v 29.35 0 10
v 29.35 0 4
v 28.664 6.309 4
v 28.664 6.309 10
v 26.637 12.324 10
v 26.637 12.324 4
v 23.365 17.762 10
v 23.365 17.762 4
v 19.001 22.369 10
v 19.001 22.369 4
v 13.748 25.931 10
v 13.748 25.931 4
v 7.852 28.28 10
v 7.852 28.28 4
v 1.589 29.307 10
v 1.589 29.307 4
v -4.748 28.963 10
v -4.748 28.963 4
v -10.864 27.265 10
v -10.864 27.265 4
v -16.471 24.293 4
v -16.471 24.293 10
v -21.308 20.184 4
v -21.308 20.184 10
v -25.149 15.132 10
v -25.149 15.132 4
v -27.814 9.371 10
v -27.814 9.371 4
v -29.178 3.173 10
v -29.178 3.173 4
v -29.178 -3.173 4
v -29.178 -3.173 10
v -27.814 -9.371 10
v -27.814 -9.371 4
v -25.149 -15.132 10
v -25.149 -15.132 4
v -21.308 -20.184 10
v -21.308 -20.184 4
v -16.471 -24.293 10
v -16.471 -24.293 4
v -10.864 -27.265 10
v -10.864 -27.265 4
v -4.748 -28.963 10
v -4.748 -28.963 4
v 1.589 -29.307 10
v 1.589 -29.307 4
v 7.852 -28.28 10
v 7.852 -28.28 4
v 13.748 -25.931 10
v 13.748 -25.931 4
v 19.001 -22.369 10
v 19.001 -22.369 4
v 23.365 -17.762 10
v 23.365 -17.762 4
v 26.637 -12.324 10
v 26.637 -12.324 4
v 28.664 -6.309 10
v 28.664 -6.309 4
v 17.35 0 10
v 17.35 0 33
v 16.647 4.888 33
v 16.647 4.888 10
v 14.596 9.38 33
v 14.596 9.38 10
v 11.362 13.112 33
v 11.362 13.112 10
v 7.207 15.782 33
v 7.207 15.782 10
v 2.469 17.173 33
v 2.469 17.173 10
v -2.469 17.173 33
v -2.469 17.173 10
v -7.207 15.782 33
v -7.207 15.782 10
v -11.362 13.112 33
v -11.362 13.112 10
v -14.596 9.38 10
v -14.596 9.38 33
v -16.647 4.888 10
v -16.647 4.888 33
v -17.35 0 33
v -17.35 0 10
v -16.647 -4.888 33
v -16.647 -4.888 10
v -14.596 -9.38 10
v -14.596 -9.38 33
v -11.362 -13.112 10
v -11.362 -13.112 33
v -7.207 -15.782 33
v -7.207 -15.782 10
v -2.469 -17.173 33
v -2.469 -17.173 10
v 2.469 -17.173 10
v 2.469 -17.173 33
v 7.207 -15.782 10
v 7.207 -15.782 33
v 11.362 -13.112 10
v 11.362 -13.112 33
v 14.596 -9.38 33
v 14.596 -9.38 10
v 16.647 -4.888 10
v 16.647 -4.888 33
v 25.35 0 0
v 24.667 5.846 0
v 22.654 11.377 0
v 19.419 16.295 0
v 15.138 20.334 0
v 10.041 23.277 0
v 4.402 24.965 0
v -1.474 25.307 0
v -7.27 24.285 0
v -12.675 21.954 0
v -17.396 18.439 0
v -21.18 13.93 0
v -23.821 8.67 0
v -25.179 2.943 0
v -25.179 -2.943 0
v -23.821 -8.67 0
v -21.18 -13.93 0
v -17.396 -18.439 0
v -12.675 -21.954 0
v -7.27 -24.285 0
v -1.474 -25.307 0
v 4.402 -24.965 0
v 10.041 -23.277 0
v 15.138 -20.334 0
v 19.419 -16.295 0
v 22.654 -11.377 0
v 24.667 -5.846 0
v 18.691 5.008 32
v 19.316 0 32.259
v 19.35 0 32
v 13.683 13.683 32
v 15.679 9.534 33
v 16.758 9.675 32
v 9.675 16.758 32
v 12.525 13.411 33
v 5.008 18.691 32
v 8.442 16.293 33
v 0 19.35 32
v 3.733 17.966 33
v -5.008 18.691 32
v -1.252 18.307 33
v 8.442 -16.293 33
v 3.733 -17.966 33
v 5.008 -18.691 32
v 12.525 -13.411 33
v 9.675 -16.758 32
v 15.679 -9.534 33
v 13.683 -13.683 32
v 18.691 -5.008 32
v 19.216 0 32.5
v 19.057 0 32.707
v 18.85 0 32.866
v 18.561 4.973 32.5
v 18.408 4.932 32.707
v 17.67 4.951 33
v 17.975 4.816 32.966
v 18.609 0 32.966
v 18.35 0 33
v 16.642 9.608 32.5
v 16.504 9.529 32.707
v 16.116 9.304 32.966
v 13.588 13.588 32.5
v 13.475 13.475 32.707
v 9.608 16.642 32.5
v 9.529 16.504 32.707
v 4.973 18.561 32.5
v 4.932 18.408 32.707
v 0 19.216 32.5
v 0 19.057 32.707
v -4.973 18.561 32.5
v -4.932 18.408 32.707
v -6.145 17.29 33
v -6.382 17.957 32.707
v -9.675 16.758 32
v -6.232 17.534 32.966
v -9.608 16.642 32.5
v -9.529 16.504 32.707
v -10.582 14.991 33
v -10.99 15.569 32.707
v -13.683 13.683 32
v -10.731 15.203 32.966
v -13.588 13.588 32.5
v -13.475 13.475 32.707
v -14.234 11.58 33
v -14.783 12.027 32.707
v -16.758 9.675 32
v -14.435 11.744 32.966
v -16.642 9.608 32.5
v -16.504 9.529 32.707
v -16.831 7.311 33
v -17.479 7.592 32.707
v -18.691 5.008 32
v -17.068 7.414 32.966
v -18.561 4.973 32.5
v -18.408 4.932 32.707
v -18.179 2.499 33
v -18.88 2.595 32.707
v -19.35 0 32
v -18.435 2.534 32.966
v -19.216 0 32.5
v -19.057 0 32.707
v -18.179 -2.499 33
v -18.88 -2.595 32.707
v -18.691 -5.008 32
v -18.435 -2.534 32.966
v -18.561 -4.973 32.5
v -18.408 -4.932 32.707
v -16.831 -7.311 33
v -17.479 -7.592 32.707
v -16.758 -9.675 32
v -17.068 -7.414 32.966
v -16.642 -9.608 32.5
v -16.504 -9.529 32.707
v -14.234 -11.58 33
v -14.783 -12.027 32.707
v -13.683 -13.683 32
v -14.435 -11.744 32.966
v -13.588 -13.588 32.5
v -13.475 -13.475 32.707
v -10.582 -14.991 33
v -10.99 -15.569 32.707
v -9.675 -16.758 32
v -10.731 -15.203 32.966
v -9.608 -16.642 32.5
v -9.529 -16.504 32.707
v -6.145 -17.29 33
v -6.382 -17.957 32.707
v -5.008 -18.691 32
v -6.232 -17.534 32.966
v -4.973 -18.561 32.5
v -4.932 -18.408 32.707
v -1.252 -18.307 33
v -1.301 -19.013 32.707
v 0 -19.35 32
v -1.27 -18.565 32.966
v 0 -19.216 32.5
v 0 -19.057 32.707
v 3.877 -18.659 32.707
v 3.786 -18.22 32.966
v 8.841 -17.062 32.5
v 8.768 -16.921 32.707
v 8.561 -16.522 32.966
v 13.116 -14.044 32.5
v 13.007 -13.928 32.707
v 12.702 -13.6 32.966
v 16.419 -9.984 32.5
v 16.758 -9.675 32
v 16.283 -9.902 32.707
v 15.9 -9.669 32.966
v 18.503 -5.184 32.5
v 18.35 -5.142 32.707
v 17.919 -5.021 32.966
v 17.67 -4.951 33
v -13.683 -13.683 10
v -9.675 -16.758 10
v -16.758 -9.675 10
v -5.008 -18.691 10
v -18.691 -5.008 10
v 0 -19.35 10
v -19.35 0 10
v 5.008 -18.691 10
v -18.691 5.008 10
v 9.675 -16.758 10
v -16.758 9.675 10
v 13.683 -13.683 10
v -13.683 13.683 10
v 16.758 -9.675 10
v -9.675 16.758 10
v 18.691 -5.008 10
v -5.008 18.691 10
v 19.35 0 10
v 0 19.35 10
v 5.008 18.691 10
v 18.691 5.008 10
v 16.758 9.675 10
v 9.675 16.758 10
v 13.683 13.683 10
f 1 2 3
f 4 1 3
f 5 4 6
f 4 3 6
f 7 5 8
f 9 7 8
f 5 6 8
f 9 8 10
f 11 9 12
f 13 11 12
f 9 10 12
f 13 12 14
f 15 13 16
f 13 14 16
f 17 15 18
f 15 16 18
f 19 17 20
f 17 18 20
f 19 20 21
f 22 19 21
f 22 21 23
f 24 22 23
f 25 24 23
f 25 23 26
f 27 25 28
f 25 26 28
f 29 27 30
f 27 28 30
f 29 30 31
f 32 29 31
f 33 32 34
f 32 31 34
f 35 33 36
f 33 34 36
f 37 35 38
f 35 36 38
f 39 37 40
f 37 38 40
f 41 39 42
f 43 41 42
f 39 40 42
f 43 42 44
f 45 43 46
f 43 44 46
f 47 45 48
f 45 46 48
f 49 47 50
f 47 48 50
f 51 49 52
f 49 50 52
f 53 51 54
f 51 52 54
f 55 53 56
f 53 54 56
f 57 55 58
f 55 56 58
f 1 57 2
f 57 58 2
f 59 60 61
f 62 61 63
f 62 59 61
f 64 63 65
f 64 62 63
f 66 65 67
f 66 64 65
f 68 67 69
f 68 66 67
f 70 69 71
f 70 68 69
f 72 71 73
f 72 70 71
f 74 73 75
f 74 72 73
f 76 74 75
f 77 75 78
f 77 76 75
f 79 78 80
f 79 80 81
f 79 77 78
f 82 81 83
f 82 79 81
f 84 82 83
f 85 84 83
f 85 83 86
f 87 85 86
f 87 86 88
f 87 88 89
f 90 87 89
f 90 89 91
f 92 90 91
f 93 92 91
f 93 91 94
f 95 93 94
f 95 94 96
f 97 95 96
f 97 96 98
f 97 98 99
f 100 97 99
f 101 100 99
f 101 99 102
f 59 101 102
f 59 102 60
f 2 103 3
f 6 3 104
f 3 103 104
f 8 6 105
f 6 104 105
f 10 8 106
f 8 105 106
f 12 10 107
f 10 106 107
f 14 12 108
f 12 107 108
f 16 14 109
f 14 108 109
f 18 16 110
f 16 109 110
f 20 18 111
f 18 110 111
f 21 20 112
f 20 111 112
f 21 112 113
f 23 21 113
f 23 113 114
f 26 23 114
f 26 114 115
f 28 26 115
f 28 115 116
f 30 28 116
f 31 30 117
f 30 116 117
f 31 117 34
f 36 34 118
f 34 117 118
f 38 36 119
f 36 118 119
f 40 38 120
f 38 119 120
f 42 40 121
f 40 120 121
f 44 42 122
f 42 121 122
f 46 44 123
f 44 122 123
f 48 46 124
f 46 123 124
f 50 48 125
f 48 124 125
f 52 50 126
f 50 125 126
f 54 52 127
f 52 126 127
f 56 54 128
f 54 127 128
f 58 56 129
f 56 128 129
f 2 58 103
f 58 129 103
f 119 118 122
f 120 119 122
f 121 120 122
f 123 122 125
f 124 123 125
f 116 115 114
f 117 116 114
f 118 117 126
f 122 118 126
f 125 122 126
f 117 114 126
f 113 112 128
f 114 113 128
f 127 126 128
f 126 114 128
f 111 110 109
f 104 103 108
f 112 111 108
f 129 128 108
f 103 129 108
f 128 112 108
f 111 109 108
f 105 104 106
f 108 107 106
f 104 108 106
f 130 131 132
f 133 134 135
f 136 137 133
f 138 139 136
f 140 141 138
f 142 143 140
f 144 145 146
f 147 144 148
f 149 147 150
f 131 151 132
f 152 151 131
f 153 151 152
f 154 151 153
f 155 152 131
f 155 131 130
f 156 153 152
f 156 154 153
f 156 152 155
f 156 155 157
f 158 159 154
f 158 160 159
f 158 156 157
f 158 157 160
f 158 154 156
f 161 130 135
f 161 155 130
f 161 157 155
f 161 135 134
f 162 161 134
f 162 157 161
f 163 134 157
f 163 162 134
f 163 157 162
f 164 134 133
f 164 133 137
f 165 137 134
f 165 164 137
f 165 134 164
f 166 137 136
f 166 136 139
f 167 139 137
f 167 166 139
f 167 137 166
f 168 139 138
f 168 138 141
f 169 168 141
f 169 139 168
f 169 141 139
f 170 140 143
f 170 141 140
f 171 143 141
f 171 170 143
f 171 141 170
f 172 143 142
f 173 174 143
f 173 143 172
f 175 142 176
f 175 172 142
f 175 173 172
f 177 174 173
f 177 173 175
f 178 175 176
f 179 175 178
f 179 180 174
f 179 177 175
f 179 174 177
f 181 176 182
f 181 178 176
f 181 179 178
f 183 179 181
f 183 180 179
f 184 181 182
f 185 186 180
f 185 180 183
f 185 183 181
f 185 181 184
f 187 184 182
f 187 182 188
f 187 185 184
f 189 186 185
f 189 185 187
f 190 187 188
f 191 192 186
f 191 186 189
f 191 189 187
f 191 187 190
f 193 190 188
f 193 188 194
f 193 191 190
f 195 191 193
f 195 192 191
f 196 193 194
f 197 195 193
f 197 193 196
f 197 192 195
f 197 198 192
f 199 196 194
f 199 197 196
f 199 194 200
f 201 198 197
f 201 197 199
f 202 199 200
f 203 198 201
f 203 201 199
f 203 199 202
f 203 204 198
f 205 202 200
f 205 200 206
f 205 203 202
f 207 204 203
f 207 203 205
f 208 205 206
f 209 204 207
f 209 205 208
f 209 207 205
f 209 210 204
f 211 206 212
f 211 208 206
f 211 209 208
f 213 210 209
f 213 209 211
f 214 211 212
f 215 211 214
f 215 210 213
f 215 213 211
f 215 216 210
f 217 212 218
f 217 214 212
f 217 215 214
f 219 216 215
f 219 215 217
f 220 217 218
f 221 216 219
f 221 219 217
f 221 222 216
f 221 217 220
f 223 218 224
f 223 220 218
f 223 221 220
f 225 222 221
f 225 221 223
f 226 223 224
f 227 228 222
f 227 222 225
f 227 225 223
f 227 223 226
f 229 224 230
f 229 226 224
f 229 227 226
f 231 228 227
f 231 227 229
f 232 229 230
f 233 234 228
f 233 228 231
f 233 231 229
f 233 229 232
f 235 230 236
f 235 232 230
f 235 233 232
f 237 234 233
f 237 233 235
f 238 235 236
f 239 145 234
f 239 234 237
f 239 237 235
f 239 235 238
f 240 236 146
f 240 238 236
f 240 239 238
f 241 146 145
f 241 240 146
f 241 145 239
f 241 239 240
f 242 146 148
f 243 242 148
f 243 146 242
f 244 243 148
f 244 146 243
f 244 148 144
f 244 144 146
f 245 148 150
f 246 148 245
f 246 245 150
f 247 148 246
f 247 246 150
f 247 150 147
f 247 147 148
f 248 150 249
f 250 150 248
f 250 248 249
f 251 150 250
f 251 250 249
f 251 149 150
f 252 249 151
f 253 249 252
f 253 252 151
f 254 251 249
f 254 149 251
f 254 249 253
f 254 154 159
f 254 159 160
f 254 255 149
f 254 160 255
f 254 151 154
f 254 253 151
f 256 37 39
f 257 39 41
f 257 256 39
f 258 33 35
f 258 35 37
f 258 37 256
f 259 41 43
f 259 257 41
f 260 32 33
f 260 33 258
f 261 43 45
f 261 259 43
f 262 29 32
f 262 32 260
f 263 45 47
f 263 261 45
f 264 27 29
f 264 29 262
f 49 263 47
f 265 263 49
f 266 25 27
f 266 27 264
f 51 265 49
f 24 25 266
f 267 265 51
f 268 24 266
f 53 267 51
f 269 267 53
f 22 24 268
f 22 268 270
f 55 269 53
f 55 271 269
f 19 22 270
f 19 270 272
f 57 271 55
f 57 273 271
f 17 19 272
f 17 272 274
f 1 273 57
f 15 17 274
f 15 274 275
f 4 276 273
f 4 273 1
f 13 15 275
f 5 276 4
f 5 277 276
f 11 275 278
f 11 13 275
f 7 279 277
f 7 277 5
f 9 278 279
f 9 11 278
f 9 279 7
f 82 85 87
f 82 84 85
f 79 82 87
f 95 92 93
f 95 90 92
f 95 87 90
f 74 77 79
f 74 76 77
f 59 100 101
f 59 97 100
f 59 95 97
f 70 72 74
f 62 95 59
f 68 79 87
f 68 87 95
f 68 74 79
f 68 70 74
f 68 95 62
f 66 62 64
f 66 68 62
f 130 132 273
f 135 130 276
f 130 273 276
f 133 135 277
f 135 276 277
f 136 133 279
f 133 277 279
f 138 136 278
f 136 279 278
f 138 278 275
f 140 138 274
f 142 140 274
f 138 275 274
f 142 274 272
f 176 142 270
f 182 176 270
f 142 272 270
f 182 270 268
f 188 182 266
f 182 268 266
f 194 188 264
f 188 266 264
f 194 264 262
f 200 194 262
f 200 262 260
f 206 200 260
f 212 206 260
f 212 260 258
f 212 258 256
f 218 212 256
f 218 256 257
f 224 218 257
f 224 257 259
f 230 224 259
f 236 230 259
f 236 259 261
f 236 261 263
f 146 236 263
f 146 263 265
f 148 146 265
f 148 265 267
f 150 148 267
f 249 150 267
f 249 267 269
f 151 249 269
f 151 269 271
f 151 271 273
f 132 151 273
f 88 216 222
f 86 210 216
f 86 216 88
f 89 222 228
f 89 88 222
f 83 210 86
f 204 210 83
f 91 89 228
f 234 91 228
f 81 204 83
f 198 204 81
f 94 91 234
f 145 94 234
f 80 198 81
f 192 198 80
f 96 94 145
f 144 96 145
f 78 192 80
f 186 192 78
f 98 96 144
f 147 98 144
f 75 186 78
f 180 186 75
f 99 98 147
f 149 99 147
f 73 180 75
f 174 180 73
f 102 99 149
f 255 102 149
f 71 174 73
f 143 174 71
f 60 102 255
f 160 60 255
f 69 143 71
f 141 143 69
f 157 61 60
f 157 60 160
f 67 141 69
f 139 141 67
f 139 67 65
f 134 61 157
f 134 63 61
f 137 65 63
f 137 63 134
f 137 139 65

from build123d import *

# Parameters (mm, degrees)
F0_R     = 29.35
F0_R_2   = 19.35
F0_R_3   = 17.35
F1_DEPTH = 10
F2_SIZE  = 4
F3_DEPTH = 33
F4_R     = 1


with BuildPart() as f1:
    # F0 (on Top) → F1 (new body)
    with BuildSketch(Plane.XY):
        Circle(F0_R)
        Circle(F0_R_2, mode=Mode.SUBTRACT)
        Circle(F0_R_2)
        Circle(F0_R_3, mode=Mode.SUBTRACT)
        Circle(F0_R_3)
    extrude(amount=F1_DEPTH)

    # F2
    f2_edges = [f1.edges().sort_by_distance(p)[0] for p in [
        (-29.35, 0, 0),
    ]]
    chamfer(f2_edges, length=F2_SIZE)

    # F0 (on Top) → F3 (join)
    with BuildSketch(Plane.XY):
        Circle(F0_R_2)
        Circle(F0_R_3, mode=Mode.SUBTRACT)
    extrude(amount=F3_DEPTH)

    # F4
    f4_edges = [f1.edges().sort_by_distance(p)[0] for p in [
        (-19.35, 0, 33),
    ]]
    fillet(f4_edges, radius=F4_R)


solid = f1.part
